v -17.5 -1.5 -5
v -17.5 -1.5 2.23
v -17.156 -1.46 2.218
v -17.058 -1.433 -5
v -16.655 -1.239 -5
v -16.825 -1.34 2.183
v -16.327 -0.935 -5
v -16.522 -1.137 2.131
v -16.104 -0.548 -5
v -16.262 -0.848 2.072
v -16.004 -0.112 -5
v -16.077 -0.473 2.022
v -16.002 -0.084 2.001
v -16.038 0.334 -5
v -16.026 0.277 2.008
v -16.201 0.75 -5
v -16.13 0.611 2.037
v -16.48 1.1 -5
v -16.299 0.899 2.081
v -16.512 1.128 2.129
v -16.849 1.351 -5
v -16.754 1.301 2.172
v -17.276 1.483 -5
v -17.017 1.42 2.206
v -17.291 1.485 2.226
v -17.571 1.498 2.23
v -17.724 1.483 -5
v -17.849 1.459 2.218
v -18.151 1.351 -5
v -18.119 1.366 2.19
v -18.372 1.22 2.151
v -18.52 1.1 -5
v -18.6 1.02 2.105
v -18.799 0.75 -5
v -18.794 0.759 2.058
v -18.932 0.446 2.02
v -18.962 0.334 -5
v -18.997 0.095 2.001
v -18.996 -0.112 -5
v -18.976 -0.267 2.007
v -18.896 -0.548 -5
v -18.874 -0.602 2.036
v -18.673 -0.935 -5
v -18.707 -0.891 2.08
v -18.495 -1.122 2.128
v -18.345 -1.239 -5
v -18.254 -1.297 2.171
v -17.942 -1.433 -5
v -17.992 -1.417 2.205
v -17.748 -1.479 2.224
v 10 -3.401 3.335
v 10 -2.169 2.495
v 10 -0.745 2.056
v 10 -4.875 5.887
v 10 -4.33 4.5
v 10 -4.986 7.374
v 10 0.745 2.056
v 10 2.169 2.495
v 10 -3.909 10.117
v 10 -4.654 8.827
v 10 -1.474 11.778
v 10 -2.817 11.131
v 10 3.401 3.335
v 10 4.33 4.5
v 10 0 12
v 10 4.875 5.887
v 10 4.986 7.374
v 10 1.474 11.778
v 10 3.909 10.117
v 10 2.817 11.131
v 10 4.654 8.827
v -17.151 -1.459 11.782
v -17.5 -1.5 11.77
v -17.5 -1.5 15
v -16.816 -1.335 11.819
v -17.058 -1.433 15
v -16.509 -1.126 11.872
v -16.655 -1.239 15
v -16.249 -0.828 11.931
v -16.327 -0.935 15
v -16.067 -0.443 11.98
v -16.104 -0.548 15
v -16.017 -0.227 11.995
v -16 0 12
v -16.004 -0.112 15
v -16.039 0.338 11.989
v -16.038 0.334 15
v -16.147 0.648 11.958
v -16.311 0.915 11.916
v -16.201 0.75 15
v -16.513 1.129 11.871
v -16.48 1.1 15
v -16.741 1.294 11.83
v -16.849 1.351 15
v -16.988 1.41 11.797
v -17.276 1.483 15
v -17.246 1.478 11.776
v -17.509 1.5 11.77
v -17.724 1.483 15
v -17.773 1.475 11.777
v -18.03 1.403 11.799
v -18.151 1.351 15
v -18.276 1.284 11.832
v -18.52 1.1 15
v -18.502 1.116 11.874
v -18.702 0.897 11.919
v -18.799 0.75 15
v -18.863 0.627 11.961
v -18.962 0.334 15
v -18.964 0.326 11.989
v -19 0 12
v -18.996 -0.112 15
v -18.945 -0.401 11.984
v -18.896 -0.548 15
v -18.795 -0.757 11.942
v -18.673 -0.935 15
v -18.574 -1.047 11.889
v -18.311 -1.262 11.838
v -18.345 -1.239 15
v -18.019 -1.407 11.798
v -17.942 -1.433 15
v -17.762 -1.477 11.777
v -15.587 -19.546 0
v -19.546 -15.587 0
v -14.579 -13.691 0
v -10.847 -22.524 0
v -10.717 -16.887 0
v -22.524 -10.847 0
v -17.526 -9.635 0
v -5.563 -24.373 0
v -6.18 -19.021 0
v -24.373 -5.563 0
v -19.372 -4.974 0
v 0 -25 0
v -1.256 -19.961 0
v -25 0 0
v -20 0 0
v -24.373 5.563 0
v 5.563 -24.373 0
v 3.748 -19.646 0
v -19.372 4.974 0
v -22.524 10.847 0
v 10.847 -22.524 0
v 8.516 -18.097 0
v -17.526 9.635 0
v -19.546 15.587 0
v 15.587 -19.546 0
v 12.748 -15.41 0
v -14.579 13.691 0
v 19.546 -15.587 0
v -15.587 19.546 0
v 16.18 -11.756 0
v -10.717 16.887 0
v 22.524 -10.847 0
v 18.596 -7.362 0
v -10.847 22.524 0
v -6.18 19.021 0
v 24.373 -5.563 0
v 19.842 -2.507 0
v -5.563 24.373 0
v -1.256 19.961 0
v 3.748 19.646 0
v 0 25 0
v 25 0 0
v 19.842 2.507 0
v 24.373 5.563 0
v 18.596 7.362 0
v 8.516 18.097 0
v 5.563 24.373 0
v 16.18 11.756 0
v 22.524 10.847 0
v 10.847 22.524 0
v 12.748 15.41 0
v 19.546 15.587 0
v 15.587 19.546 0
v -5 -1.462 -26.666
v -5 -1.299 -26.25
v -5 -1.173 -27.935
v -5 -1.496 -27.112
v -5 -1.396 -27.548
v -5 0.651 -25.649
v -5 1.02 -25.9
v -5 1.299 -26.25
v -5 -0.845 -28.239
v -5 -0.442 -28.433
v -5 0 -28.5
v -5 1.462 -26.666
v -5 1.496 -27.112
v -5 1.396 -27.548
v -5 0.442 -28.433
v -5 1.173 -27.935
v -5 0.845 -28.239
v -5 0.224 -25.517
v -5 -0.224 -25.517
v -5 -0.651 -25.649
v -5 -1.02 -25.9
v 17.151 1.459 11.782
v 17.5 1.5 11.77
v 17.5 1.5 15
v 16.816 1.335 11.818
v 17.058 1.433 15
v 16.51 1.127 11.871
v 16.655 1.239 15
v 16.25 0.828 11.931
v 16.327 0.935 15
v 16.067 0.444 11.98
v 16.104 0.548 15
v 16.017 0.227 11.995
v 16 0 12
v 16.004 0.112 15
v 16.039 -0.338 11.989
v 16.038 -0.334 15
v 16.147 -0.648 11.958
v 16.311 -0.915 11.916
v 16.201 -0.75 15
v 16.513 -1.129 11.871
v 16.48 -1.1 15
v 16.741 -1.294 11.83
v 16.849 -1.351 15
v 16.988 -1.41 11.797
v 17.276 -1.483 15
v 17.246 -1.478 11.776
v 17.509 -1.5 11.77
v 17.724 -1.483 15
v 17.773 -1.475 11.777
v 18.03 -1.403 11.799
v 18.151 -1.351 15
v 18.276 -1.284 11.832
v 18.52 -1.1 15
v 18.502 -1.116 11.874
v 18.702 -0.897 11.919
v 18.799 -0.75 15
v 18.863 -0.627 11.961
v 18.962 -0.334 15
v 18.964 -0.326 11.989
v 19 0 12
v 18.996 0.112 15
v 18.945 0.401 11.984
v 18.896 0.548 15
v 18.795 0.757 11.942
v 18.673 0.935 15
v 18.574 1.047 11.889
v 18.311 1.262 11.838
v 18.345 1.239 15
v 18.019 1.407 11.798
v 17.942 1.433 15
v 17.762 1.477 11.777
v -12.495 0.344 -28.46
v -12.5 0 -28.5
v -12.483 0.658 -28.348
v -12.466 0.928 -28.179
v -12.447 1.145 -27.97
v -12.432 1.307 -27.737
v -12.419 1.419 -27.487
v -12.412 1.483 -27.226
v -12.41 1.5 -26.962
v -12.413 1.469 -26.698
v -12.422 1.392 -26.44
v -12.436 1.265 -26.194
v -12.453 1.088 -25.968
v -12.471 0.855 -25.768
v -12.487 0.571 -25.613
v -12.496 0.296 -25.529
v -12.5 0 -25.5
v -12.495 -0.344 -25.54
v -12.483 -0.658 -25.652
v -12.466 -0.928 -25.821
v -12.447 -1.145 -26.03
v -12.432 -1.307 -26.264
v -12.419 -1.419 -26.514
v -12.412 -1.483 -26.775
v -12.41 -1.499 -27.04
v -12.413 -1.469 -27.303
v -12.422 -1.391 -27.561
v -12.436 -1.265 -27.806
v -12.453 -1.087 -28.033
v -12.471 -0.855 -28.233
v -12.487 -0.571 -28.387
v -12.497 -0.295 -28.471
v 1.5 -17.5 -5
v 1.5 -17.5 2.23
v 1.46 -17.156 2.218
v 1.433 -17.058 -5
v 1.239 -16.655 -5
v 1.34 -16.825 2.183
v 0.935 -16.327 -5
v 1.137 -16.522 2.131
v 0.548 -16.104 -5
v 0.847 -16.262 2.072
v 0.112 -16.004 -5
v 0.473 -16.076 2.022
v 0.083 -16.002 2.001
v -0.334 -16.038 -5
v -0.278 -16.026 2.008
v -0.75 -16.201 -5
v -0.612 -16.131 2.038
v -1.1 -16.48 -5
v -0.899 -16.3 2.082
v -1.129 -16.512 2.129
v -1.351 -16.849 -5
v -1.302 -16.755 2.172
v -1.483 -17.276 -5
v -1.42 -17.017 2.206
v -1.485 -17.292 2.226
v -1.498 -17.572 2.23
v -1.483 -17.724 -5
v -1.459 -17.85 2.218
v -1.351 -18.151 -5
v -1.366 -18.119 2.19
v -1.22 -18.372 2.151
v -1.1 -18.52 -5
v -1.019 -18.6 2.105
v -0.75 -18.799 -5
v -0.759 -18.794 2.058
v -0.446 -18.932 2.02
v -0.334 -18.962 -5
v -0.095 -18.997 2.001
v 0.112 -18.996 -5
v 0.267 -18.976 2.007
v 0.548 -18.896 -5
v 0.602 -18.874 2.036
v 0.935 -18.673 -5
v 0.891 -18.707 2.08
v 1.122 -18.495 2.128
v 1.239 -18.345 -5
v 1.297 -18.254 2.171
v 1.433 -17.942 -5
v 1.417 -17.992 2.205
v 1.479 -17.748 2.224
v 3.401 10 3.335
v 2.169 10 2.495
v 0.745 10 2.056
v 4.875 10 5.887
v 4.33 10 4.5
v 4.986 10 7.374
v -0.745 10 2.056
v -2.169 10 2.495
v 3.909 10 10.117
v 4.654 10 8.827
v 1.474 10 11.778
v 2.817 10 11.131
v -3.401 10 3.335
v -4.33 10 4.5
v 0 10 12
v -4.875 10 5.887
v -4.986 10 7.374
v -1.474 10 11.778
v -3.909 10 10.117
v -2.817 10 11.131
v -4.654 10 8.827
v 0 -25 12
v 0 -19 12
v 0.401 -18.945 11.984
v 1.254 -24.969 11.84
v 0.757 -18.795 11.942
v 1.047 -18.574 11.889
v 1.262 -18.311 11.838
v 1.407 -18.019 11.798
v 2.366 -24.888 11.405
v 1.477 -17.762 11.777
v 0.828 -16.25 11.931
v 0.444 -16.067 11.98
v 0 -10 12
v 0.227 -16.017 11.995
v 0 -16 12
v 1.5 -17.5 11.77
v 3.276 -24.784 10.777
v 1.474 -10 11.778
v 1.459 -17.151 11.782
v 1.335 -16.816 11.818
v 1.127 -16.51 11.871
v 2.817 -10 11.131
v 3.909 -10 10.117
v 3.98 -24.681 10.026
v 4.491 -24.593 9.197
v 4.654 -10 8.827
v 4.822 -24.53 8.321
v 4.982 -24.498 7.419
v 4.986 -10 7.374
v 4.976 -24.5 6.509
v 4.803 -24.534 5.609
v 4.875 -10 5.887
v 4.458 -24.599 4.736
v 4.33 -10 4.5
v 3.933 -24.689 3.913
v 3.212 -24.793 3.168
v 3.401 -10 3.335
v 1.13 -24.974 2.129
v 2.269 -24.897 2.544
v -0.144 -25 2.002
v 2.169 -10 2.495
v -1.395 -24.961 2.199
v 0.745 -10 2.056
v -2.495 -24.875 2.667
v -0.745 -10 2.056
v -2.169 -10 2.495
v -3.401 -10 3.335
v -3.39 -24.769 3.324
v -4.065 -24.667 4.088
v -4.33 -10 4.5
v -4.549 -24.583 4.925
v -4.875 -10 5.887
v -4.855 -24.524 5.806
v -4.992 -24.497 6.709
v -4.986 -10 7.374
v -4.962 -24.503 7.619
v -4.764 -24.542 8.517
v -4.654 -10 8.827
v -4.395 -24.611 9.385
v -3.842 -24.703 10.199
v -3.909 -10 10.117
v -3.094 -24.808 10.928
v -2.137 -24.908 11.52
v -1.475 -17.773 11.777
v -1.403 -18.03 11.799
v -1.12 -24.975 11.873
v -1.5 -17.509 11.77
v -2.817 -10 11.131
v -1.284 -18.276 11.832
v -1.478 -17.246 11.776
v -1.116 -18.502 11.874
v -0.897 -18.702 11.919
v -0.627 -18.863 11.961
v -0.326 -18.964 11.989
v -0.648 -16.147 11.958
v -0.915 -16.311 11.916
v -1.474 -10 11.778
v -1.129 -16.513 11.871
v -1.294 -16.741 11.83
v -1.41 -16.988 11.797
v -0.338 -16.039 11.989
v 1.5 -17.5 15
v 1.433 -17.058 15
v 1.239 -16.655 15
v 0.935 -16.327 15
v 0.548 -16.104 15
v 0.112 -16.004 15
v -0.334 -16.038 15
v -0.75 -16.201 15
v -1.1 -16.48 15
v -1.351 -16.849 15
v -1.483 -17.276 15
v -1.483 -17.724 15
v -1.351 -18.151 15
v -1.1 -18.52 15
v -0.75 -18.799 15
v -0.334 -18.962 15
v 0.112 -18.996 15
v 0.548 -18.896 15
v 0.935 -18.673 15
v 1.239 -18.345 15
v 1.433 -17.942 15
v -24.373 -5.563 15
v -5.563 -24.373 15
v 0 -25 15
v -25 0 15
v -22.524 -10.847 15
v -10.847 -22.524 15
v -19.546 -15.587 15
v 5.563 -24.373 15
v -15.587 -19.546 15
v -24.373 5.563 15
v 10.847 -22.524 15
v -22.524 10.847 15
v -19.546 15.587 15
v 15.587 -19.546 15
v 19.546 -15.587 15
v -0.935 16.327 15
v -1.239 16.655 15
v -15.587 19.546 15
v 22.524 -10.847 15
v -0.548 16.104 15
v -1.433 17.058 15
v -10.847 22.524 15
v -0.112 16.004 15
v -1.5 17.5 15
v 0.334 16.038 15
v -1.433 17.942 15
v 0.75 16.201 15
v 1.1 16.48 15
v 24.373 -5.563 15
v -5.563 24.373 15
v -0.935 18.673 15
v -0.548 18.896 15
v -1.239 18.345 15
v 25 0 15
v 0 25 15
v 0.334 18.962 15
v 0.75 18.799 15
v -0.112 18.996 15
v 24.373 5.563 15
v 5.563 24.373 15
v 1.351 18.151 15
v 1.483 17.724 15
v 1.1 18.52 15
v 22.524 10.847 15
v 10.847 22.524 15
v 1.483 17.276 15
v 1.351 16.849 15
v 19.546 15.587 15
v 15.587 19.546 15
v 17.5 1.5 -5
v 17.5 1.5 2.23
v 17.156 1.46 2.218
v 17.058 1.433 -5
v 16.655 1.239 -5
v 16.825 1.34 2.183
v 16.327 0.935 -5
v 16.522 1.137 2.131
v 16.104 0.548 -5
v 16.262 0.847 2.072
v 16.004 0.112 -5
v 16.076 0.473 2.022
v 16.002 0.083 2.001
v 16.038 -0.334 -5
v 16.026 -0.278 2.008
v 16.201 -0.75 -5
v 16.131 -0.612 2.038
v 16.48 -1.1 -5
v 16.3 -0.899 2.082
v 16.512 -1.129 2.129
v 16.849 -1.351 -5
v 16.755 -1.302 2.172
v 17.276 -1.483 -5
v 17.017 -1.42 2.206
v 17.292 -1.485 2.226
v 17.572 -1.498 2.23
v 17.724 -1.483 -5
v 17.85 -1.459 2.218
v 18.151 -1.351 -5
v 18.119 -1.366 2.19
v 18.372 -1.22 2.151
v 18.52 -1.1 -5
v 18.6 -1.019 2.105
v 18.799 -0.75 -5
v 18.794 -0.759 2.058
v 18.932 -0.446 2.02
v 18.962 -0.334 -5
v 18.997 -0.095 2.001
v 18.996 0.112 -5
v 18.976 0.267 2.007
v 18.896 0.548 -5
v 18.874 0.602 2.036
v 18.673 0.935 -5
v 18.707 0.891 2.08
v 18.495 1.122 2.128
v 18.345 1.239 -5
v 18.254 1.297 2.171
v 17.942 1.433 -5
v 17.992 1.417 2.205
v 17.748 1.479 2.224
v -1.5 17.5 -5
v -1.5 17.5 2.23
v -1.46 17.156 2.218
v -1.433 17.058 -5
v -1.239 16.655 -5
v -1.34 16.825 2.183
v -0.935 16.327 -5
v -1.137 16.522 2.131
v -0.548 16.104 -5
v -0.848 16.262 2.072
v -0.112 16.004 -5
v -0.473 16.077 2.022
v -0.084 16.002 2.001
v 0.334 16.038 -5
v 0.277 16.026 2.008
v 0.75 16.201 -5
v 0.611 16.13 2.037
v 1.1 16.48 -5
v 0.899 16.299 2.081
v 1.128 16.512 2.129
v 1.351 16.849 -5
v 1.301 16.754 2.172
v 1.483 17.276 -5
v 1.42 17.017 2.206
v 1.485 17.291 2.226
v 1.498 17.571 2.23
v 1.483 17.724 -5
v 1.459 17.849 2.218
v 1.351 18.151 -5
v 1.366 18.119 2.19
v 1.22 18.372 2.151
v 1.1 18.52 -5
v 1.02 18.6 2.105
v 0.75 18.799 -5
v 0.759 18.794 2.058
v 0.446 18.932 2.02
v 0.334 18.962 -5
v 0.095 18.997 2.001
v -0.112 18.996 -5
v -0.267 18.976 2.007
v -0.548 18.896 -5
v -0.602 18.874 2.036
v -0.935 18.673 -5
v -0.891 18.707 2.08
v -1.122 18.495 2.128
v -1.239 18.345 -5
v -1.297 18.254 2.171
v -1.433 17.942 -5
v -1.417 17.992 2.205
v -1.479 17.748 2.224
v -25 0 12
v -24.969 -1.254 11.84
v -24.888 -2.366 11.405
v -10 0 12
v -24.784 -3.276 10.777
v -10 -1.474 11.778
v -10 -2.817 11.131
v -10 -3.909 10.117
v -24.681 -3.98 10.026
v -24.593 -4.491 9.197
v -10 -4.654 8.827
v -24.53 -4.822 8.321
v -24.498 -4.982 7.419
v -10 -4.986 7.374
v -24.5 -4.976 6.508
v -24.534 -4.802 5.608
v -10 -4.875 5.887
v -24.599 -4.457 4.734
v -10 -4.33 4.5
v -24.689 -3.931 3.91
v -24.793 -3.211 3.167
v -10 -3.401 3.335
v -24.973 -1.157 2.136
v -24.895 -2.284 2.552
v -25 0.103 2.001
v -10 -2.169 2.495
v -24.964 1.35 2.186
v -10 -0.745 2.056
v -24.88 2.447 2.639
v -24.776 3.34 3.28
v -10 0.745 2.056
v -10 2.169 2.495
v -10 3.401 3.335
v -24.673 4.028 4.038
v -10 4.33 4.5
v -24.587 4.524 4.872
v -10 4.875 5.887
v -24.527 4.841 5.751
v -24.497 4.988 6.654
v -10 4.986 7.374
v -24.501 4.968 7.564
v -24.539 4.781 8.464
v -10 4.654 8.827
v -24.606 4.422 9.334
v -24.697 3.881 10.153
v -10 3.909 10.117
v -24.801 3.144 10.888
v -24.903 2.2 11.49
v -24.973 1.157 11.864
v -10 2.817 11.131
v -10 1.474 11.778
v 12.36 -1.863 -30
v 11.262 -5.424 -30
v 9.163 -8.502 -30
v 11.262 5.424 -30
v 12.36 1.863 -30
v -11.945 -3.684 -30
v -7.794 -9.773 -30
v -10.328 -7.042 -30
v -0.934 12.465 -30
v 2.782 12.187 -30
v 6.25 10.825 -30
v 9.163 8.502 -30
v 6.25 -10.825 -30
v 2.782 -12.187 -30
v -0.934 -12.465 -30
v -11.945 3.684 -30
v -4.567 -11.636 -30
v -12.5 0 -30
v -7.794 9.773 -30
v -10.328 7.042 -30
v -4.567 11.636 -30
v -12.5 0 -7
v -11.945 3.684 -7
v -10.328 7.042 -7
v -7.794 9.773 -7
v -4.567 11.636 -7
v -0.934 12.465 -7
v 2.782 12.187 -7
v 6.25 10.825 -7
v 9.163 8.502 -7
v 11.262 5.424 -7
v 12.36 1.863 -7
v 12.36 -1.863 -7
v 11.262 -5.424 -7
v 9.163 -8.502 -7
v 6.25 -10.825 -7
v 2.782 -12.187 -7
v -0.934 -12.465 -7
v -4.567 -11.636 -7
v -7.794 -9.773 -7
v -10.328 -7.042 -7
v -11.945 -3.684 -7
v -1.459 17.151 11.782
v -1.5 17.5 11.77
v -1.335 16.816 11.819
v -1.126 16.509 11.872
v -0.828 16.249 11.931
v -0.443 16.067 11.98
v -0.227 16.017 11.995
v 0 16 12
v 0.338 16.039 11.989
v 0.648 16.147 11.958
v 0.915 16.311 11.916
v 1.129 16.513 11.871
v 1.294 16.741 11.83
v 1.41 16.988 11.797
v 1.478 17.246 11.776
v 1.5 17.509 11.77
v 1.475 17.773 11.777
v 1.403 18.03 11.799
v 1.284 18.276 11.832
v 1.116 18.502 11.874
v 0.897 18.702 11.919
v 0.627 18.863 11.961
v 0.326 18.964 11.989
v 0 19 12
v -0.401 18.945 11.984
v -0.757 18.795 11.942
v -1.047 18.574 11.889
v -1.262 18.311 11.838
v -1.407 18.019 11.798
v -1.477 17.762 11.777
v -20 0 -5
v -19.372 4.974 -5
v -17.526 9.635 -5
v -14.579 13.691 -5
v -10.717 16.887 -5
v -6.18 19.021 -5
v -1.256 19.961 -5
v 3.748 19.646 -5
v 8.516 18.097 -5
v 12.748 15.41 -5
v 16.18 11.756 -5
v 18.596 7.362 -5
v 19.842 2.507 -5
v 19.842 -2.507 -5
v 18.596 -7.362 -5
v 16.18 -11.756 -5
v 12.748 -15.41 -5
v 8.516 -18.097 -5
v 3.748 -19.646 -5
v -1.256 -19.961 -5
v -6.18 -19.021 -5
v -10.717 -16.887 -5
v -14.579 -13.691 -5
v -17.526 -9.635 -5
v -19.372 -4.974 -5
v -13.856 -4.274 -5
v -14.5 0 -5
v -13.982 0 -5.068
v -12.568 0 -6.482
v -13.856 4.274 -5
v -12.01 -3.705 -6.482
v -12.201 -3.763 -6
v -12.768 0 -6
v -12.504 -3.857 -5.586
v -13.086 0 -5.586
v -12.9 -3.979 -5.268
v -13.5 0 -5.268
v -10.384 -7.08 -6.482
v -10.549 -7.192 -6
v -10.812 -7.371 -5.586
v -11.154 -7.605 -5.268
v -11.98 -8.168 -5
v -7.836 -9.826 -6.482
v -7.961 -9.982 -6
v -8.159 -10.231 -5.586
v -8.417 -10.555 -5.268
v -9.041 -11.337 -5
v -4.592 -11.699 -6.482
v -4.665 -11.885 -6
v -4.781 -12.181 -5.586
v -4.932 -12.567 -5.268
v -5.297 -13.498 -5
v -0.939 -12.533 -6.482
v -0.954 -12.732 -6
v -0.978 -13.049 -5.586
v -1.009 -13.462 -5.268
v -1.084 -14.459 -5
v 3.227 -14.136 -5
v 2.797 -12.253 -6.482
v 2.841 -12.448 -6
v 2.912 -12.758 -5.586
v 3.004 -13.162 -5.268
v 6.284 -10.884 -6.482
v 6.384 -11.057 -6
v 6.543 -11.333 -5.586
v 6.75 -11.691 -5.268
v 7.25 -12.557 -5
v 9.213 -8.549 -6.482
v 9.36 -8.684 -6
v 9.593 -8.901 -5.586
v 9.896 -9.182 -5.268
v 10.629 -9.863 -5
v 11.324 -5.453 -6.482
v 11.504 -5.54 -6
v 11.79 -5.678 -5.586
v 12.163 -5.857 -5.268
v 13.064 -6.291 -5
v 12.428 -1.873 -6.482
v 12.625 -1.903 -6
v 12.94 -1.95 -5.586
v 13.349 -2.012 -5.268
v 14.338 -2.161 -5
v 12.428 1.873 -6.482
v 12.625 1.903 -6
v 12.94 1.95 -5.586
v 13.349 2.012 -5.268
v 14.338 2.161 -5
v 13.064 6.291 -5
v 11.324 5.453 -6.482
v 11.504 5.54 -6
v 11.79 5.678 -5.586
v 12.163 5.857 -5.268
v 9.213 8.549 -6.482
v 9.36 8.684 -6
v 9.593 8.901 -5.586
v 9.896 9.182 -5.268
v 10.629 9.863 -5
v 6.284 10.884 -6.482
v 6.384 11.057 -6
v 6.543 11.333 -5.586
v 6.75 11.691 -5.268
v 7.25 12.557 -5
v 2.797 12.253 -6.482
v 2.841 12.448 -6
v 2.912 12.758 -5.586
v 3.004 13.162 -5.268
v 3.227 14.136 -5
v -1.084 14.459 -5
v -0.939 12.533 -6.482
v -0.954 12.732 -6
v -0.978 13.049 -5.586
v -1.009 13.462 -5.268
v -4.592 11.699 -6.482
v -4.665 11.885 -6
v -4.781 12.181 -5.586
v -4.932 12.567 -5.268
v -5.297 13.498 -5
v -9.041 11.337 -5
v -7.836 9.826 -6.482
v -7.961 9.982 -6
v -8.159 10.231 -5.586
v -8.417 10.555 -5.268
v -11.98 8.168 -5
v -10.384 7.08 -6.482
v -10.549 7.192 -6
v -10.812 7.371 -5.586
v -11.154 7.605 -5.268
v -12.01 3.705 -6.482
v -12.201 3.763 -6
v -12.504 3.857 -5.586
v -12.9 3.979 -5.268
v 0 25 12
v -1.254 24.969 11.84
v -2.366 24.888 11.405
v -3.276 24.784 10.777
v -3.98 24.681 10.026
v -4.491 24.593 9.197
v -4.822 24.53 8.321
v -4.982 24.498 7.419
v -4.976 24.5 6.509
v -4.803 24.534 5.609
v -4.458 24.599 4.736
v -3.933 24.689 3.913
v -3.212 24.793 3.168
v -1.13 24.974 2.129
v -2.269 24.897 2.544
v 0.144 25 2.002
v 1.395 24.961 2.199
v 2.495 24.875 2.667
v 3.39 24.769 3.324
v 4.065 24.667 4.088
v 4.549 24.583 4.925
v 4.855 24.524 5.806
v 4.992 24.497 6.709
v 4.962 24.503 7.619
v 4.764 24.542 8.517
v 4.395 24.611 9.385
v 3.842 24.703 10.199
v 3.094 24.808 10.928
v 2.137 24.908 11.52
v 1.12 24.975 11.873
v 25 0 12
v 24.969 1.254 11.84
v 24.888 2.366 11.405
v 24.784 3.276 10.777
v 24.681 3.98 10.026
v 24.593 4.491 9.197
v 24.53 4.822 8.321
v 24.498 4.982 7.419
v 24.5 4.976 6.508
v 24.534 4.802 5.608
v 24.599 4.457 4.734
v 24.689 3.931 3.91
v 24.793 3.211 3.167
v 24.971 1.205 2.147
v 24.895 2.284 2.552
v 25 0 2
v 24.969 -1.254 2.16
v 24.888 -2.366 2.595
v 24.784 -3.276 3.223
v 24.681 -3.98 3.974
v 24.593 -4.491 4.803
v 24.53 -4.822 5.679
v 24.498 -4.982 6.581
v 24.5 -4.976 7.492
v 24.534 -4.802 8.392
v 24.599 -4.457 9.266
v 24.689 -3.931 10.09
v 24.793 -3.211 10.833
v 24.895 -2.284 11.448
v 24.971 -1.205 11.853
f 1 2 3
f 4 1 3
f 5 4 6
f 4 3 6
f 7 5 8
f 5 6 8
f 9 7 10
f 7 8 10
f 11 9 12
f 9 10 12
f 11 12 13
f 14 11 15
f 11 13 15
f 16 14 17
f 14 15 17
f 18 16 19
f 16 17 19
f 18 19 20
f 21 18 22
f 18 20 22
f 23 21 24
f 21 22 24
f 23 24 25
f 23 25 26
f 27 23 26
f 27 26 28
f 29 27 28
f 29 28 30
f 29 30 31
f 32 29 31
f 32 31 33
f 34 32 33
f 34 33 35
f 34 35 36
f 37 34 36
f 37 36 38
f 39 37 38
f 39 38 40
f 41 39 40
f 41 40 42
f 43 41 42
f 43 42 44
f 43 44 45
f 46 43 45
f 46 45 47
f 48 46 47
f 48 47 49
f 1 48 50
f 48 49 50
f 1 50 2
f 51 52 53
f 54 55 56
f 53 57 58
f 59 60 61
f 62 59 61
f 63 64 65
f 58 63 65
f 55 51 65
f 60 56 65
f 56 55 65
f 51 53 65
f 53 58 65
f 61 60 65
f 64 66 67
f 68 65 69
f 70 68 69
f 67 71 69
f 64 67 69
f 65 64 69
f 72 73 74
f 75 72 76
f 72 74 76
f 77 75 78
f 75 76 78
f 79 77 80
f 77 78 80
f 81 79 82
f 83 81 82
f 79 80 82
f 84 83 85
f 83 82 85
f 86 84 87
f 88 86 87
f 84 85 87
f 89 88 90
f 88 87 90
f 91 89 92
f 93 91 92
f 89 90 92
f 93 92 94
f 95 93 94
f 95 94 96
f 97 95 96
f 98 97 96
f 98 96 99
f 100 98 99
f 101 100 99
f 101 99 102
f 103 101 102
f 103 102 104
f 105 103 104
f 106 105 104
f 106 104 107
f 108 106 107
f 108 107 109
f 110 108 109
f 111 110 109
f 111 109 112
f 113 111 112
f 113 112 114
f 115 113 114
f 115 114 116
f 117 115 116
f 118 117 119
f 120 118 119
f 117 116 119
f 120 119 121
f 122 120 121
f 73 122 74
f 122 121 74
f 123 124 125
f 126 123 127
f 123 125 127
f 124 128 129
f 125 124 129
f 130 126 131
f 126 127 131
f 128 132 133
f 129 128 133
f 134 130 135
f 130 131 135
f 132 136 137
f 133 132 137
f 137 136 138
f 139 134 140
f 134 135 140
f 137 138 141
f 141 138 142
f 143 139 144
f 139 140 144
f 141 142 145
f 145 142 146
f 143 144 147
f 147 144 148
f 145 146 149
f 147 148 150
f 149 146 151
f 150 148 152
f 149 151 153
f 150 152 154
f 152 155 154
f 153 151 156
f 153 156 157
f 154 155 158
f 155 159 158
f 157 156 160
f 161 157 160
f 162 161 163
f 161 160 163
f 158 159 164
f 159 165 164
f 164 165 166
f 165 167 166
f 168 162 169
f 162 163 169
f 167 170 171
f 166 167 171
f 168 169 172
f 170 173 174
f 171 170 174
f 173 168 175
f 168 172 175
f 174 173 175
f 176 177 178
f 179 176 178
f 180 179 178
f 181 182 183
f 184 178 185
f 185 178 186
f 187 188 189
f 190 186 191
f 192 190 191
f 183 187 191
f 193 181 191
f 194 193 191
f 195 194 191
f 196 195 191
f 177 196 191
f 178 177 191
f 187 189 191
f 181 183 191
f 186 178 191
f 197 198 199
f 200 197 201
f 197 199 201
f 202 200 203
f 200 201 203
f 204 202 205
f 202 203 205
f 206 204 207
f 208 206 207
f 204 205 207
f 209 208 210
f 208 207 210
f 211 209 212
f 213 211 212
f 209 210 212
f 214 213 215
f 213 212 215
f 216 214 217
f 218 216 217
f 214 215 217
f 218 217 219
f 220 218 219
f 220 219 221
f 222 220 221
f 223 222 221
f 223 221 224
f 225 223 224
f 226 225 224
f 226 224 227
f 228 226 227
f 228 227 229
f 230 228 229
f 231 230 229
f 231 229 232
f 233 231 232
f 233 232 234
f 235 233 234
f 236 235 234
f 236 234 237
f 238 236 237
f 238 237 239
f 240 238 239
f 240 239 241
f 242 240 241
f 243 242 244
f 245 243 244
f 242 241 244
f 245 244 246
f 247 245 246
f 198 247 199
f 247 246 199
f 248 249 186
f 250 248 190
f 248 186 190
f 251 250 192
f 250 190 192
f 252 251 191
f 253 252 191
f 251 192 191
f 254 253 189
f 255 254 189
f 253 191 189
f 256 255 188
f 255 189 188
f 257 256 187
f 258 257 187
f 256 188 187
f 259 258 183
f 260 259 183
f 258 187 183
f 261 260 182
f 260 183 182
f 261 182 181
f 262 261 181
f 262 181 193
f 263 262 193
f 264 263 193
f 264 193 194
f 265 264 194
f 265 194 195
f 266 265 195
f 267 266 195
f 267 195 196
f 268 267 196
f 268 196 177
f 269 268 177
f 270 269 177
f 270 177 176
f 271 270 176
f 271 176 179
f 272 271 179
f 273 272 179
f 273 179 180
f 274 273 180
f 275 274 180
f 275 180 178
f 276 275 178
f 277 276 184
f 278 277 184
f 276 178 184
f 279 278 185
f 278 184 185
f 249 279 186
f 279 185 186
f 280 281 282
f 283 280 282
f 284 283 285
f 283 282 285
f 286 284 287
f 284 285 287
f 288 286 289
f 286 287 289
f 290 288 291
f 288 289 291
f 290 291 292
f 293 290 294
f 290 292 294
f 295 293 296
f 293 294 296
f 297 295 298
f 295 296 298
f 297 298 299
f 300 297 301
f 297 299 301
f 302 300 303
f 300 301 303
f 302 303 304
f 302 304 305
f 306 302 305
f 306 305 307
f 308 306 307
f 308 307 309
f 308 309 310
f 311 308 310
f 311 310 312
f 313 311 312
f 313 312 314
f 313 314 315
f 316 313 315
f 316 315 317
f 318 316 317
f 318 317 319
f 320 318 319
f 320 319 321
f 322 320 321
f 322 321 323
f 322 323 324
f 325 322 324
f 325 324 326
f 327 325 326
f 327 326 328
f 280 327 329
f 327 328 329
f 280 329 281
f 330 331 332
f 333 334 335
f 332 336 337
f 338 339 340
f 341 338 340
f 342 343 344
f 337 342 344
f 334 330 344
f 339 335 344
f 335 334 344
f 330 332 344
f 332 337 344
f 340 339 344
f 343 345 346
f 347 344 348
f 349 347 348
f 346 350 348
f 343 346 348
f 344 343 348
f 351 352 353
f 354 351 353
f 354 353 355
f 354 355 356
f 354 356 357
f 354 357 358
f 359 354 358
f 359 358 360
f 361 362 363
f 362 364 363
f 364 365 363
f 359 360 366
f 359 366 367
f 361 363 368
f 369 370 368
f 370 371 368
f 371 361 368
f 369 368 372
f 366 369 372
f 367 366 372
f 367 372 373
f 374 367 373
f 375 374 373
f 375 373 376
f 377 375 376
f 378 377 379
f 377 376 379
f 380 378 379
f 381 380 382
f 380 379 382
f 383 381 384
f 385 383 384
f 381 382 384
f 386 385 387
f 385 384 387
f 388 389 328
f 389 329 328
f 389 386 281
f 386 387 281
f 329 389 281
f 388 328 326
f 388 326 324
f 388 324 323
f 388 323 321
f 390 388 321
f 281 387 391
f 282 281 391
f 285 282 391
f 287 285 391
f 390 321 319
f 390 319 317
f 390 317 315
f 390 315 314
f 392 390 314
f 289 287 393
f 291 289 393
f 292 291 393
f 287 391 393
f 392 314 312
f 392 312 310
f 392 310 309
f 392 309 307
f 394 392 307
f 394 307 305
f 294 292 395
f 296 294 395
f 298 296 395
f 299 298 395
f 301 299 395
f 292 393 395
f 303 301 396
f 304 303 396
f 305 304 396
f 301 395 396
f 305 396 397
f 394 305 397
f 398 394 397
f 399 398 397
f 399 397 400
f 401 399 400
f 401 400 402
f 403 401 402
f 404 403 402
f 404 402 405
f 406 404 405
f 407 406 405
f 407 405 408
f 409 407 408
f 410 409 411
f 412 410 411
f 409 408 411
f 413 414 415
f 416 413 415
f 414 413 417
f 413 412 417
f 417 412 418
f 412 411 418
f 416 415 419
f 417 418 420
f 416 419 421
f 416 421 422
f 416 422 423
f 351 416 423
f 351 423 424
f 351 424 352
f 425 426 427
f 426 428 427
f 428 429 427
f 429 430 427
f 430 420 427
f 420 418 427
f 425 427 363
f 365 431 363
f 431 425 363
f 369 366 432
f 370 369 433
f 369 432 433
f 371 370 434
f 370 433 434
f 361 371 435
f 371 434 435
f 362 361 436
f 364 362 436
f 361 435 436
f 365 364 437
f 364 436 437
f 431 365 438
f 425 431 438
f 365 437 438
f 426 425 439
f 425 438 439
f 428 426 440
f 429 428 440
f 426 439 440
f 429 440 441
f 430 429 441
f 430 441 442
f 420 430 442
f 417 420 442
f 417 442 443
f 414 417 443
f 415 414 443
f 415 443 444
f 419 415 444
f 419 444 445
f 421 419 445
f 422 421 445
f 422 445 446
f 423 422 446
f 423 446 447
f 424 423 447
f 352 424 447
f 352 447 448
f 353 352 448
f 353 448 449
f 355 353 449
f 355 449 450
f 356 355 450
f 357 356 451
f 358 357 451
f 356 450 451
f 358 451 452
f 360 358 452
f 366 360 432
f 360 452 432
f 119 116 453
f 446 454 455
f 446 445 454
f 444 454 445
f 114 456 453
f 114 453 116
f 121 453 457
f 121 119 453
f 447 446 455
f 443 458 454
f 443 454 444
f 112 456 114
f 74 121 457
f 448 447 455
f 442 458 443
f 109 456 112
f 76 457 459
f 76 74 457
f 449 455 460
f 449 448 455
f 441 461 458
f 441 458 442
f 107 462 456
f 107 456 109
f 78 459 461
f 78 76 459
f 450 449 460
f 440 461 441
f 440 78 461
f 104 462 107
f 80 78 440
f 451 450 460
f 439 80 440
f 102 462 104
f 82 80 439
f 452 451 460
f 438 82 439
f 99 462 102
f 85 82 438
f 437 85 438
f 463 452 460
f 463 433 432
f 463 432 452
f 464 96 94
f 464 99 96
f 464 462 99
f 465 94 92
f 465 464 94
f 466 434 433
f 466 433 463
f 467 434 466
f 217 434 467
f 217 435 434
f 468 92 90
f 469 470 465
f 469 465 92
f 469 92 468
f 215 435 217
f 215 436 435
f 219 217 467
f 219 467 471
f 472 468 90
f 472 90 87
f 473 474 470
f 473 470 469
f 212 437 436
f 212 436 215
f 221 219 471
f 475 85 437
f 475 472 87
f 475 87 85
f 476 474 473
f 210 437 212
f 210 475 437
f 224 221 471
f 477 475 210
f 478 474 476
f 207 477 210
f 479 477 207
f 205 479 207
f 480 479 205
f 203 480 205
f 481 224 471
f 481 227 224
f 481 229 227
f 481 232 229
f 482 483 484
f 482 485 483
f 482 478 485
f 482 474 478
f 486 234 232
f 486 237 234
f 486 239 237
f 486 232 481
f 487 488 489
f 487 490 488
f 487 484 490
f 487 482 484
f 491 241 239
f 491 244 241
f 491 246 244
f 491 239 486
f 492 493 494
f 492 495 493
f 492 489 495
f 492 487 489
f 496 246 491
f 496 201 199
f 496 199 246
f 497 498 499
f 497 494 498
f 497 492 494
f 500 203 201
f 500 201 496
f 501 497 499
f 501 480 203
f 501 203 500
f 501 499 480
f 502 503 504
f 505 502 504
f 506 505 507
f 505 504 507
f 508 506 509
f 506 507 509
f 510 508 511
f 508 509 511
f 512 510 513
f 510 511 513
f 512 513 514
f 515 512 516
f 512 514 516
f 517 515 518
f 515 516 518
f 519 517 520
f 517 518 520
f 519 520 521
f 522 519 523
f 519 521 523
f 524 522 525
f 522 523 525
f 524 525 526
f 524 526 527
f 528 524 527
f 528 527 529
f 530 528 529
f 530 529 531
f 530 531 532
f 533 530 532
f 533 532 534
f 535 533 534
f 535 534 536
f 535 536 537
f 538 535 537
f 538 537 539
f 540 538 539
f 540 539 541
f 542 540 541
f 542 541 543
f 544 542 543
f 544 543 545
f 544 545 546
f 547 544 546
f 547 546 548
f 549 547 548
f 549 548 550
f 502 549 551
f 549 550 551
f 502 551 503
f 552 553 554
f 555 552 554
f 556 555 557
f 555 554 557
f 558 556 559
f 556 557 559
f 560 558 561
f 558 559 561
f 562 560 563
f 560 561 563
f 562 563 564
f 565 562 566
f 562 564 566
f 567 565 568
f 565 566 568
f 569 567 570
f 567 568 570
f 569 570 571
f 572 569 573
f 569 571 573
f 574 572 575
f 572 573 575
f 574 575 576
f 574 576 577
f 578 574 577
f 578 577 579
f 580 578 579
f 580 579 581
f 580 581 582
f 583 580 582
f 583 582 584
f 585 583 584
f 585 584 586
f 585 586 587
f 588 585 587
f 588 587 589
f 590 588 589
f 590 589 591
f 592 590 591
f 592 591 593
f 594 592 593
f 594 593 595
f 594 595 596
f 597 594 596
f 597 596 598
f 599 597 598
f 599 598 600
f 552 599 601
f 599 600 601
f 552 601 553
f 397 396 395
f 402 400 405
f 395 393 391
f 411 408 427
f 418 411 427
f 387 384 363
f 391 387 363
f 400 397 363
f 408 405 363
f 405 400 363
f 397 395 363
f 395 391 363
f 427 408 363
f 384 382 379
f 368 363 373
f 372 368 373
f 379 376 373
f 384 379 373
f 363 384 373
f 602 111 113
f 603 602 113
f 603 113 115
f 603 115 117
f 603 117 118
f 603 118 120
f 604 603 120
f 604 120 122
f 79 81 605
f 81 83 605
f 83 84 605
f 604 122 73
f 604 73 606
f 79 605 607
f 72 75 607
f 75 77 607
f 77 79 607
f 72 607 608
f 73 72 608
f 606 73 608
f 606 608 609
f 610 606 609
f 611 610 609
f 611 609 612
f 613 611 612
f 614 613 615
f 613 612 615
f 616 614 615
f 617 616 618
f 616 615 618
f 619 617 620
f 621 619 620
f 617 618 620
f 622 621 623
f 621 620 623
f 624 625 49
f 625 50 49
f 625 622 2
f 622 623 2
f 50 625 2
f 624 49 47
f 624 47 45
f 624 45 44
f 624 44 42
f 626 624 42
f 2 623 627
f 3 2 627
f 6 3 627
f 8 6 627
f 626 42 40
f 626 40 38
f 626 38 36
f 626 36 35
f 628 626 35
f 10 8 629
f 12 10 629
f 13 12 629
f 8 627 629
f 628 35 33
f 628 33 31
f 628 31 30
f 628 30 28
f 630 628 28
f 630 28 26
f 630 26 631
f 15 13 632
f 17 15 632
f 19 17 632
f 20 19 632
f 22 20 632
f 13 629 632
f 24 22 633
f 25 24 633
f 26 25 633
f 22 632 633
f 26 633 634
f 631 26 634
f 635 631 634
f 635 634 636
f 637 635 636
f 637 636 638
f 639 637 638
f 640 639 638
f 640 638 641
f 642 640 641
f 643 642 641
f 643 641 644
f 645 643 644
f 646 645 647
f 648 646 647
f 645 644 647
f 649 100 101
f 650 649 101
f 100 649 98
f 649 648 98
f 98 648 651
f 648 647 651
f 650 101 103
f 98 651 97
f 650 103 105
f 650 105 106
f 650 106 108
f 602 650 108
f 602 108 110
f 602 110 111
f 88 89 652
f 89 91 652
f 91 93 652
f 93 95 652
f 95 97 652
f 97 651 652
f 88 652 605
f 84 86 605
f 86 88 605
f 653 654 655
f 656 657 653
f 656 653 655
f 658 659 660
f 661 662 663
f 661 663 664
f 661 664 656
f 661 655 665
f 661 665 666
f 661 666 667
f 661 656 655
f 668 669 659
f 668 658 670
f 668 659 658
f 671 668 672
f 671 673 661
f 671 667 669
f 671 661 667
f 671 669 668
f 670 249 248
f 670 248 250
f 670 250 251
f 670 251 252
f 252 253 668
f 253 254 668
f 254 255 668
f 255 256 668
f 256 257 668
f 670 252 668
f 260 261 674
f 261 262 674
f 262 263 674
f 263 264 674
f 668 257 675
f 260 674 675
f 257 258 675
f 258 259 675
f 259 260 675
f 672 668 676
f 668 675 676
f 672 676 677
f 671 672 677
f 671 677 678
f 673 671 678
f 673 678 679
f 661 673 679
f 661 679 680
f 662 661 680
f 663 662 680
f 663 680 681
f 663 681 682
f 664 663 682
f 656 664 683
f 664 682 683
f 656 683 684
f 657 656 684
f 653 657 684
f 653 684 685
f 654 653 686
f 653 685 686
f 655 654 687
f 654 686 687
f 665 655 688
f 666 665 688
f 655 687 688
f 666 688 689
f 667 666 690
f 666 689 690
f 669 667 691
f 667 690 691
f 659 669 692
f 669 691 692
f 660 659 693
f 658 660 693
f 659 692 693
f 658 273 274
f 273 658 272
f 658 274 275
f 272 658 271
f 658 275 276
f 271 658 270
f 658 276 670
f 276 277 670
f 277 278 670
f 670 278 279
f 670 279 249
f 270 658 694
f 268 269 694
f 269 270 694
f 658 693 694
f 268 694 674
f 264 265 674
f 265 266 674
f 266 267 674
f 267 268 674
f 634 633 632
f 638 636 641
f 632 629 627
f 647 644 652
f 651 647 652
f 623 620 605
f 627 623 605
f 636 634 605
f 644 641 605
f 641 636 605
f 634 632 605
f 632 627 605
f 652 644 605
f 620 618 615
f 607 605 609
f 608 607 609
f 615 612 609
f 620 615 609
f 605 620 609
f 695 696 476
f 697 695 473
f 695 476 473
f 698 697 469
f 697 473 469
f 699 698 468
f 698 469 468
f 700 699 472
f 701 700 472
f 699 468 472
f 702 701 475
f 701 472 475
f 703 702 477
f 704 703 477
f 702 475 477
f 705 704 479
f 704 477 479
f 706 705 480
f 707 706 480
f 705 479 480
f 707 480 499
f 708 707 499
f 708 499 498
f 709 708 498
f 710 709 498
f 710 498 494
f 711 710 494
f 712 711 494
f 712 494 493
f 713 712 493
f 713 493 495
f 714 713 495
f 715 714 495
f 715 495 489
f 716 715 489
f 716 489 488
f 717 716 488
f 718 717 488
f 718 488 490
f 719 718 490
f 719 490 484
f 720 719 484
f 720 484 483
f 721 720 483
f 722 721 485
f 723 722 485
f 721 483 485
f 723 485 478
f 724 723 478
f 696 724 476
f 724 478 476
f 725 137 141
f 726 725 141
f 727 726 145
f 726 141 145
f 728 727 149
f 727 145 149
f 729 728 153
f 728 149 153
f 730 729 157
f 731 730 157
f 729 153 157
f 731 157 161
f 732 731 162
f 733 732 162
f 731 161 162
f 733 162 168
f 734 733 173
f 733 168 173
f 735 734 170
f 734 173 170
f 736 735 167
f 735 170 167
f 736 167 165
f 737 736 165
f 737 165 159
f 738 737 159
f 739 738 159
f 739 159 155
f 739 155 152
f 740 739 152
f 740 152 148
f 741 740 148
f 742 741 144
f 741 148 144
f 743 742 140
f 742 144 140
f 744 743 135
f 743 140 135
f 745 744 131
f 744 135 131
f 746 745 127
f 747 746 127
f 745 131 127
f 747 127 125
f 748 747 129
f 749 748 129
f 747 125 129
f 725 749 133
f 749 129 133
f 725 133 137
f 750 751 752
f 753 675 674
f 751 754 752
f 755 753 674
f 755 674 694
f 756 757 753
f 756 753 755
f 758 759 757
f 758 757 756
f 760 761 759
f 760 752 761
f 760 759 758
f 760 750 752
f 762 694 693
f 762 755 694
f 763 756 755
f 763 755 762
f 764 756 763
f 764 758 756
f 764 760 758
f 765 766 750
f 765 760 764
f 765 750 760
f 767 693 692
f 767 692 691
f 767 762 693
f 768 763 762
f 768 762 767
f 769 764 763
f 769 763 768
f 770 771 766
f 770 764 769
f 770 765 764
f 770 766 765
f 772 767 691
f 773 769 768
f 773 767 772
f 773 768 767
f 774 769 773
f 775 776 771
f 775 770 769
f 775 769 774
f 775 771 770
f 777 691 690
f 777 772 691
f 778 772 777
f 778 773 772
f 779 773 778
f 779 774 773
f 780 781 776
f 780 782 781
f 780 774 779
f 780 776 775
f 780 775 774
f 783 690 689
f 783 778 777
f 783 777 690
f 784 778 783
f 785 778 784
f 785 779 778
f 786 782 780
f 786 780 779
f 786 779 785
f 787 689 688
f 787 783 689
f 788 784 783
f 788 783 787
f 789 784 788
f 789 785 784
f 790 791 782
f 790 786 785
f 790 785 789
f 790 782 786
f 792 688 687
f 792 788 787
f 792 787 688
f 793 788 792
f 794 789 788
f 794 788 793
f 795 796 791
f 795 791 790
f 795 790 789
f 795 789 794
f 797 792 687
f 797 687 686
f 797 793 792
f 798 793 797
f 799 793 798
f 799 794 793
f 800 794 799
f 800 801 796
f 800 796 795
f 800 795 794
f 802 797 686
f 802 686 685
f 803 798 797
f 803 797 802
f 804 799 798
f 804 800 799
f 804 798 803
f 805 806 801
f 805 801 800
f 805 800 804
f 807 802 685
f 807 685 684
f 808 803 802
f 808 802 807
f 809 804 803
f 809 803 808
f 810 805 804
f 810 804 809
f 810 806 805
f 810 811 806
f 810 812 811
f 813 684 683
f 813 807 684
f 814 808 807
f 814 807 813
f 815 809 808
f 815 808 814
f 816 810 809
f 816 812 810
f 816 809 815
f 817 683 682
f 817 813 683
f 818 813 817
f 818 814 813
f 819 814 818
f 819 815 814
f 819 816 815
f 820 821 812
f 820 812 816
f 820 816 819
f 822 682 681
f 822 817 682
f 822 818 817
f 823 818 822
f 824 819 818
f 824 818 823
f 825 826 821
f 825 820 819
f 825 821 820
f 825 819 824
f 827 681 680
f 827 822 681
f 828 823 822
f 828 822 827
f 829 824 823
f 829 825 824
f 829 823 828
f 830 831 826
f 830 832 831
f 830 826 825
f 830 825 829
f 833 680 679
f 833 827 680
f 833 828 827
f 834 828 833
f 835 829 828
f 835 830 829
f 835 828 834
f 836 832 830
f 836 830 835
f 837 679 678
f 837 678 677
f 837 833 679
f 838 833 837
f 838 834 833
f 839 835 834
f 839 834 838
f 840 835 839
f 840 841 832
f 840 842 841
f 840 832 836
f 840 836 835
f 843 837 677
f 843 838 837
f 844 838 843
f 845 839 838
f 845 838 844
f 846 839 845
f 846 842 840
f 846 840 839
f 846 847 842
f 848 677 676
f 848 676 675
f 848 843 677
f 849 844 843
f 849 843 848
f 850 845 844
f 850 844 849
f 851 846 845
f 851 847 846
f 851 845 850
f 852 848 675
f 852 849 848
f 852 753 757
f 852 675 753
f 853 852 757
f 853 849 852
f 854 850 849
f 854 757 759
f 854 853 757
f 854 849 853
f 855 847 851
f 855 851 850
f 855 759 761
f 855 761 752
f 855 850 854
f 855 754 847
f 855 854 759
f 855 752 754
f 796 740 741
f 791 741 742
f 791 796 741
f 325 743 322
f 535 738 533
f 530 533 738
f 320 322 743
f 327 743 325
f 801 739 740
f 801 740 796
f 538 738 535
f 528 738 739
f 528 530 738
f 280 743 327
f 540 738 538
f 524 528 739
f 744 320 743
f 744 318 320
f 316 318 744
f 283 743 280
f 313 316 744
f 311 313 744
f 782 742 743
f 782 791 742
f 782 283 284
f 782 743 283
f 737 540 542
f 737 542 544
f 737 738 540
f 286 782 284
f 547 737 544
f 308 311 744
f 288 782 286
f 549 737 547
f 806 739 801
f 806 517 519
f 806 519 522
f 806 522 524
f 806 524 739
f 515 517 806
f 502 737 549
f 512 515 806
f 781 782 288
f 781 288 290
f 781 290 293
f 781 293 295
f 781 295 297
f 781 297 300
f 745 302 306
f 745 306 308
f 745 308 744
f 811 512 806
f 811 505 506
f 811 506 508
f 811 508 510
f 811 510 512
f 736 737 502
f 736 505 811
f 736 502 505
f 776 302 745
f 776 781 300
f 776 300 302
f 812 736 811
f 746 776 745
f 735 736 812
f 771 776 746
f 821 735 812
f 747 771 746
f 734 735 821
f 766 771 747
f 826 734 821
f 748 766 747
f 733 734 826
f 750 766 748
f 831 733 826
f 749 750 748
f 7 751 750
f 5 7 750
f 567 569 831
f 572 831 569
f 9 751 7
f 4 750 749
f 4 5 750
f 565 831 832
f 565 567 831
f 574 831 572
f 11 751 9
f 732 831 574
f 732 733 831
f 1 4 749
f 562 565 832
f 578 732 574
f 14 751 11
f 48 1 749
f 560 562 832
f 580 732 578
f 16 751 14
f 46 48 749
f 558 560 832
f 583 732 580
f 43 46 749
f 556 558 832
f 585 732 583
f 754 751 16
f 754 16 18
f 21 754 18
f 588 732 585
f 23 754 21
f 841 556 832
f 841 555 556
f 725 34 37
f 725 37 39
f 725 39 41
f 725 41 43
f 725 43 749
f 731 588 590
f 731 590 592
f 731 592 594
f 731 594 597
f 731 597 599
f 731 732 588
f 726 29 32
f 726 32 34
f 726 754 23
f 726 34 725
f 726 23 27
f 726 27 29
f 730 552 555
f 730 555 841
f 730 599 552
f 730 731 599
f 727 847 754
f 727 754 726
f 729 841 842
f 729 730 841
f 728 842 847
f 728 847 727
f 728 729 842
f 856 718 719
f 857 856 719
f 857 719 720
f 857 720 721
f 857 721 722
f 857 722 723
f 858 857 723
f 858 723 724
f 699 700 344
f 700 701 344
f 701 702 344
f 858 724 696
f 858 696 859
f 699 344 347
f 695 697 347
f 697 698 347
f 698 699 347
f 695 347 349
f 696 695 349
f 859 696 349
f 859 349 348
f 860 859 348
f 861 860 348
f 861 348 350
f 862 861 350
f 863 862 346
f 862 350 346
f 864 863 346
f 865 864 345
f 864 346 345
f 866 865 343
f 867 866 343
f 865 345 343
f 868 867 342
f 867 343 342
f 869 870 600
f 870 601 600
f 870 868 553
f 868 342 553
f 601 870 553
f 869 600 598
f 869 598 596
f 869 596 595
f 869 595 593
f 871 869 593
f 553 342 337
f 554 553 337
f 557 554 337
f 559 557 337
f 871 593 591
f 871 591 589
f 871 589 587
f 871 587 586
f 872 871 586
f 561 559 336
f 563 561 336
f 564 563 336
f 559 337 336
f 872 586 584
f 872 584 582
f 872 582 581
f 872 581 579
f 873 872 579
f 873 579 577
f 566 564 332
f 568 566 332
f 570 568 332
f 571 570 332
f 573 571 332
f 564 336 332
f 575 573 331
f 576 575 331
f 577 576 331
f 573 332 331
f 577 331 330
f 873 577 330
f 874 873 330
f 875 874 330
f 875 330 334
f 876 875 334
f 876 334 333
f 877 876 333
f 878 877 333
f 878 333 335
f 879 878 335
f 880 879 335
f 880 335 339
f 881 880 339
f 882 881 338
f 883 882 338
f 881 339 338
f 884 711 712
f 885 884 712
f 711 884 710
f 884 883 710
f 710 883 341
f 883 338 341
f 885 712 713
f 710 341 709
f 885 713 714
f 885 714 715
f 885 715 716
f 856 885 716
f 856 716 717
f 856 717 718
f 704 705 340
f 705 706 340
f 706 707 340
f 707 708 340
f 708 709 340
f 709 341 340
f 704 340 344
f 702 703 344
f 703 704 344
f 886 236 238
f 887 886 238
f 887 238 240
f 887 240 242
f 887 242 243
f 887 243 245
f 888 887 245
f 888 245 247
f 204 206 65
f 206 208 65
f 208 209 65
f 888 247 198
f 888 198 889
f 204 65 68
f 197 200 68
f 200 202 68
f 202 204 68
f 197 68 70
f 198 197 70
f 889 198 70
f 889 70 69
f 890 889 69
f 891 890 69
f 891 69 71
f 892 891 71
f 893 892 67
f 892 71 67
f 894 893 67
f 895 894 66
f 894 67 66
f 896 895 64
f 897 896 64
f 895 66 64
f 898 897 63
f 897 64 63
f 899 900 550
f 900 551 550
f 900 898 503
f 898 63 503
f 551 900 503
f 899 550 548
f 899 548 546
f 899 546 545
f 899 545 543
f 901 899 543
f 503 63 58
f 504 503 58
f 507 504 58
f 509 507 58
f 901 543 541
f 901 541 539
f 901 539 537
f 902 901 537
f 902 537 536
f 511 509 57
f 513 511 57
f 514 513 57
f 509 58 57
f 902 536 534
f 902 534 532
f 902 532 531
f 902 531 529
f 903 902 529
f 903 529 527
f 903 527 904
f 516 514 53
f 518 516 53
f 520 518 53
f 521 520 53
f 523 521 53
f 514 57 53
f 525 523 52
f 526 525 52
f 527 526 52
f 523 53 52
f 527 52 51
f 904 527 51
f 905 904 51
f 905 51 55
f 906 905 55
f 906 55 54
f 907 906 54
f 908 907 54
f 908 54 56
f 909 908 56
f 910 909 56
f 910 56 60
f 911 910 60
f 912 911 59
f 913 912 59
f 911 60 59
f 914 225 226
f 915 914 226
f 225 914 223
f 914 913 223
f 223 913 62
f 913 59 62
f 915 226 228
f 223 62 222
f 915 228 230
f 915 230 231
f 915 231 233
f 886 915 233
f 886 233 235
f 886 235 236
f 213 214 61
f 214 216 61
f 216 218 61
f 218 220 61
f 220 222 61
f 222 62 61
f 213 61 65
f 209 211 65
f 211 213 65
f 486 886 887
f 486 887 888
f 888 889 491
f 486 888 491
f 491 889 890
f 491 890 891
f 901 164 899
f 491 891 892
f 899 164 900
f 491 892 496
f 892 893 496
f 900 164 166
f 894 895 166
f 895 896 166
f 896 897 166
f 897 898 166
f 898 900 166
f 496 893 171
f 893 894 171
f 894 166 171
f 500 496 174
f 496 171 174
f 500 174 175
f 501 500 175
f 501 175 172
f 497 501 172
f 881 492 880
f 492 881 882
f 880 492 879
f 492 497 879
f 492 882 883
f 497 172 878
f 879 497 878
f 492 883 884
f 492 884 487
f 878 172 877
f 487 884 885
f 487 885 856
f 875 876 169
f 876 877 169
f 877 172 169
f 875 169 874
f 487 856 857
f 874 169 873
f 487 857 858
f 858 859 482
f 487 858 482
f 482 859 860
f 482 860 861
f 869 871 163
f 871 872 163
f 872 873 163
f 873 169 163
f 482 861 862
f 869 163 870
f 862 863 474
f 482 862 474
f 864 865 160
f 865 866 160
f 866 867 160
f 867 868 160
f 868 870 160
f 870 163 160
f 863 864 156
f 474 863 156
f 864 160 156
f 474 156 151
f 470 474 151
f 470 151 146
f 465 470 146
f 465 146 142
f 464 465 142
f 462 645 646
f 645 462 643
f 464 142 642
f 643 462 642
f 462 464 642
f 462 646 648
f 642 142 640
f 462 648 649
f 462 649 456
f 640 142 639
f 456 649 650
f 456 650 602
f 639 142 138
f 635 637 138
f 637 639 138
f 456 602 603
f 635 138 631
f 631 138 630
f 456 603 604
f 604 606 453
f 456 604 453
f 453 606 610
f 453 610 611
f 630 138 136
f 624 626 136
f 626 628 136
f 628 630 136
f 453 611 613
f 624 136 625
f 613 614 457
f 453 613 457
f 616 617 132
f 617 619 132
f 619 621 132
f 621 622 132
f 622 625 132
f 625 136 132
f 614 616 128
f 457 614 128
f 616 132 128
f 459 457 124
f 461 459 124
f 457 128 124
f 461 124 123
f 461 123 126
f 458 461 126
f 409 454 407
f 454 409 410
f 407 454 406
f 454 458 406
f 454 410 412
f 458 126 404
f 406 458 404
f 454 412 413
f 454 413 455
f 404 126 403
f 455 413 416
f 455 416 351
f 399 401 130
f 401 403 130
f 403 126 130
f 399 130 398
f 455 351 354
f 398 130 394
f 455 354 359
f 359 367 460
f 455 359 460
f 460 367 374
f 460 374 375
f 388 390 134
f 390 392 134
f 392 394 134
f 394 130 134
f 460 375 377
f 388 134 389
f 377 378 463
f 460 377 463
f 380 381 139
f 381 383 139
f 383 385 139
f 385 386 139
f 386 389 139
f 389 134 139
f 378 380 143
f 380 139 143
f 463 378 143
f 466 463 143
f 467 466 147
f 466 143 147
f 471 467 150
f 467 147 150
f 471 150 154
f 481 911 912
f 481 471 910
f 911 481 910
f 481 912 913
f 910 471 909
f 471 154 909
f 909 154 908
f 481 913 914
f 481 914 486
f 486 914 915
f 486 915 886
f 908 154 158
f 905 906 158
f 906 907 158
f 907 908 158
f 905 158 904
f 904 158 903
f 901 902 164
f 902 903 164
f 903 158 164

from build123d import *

# Parameters (mm, degrees)
SKETCH1_R           = 25
BOSS_EXTRUDE1_DEPTH = 15
CUT_EXTRUDE1_START  = -10
SKETCH2_R           = 5
CUT_EXTRUDE1_DEPTH  = 60
SKETCH8_R           = 20
BOSS_EXTRUDE4_DEPTH = 5
SKETCH3_R           = 1.5
CUT_EXTRUDE2_DEPTH  = 20
CIRPATTERN2_COUNT   = 4
SKETCH4_R           = 12.5
BOSS_EXTRUDE2_DEPTH = 30
CUT_EXTRUDE4_START  = -5
SKETCH7_R           = 1.5
CUT_EXTRUDE4_DEPTH  = 15
FILLET3_R           = 2


with BuildPart() as part:
    # Sketch1 → Boss-Extrude1 (new body)
    with BuildSketch(Plane.XY):
        Circle(SKETCH1_R)
    extrude(amount=BOSS_EXTRUDE1_DEPTH)

    # Sketch2 → Cut-Extrude1 (cut)
    with BuildSketch(Plane(origin=(0, 0, 0), x_dir=(1, 0, 0), z_dir=(0, 1, 0)).offset(CUT_EXTRUDE1_START)):
        with Locations(Location((0, -7, 0), (0, 0, 270))):
            Circle(SKETCH2_R)
    cut_extrude1 = extrude(amount=-CUT_EXTRUDE1_DEPTH, mode=Mode.SUBTRACT)

    # Sketch8 → Boss-Extrude4 (add)
    with BuildSketch(Plane(origin=(0, 0, 0), x_dir=(-1, 0, 0), z_dir=(0, 0, -1))):
        Circle(SKETCH8_R)
    extrude(amount=BOSS_EXTRUDE4_DEPTH)

    # Sketch3 → Cut-Extrude2 (cut)
    with BuildSketch(Plane.XY.offset(15)):
        with Locations((0, -17.5)):
            Circle(SKETCH3_R)
    cut_extrude2 = extrude(amount=-CUT_EXTRUDE2_DEPTH, mode=Mode.SUBTRACT)

    # CirPattern2: Cut-Extrude1, Cut-Extrude2 ×4 about axis
    cirpattern2_axis = Axis((0, 0, 0), (0, 0, 1))
    add([cut_extrude1.rotate(cirpattern2_axis, i * 360 / CIRPATTERN2_COUNT) for i in range(1, CIRPATTERN2_COUNT)], mode=Mode.SUBTRACT)
    add([cut_extrude2.rotate(cirpattern2_axis, i * 360 / CIRPATTERN2_COUNT) for i in range(1, CIRPATTERN2_COUNT)], mode=Mode.SUBTRACT)

    # Sketch4 → Boss-Extrude2 (add)
    with BuildSketch(Plane(origin=(0, 0, 0), x_dir=(-1, 0, 0), z_dir=(0, 0, -1))):
        Circle(SKETCH4_R)
    extrude(amount=BOSS_EXTRUDE2_DEPTH)

    # Sketch7 → Cut-Extrude4 (cut)
    with BuildSketch(Plane(origin=(0, 0, 0), x_dir=(0, 0, -1), z_dir=(1, 0, 0)).offset(CUT_EXTRUDE4_START)):
        with Locations((27, 0)):
            Circle(SKETCH7_R)
    extrude(amount=-CUT_EXTRUDE4_DEPTH, mode=Mode.SUBTRACT)

    # Fillet3
    fillet3_edges = [part.edges().sort_by_distance(p)[0] for p in [
        (12.5, 0, -5),
    ]]
    fillet(fillet3_edges, radius=FILLET3_R)


solid = part.part
